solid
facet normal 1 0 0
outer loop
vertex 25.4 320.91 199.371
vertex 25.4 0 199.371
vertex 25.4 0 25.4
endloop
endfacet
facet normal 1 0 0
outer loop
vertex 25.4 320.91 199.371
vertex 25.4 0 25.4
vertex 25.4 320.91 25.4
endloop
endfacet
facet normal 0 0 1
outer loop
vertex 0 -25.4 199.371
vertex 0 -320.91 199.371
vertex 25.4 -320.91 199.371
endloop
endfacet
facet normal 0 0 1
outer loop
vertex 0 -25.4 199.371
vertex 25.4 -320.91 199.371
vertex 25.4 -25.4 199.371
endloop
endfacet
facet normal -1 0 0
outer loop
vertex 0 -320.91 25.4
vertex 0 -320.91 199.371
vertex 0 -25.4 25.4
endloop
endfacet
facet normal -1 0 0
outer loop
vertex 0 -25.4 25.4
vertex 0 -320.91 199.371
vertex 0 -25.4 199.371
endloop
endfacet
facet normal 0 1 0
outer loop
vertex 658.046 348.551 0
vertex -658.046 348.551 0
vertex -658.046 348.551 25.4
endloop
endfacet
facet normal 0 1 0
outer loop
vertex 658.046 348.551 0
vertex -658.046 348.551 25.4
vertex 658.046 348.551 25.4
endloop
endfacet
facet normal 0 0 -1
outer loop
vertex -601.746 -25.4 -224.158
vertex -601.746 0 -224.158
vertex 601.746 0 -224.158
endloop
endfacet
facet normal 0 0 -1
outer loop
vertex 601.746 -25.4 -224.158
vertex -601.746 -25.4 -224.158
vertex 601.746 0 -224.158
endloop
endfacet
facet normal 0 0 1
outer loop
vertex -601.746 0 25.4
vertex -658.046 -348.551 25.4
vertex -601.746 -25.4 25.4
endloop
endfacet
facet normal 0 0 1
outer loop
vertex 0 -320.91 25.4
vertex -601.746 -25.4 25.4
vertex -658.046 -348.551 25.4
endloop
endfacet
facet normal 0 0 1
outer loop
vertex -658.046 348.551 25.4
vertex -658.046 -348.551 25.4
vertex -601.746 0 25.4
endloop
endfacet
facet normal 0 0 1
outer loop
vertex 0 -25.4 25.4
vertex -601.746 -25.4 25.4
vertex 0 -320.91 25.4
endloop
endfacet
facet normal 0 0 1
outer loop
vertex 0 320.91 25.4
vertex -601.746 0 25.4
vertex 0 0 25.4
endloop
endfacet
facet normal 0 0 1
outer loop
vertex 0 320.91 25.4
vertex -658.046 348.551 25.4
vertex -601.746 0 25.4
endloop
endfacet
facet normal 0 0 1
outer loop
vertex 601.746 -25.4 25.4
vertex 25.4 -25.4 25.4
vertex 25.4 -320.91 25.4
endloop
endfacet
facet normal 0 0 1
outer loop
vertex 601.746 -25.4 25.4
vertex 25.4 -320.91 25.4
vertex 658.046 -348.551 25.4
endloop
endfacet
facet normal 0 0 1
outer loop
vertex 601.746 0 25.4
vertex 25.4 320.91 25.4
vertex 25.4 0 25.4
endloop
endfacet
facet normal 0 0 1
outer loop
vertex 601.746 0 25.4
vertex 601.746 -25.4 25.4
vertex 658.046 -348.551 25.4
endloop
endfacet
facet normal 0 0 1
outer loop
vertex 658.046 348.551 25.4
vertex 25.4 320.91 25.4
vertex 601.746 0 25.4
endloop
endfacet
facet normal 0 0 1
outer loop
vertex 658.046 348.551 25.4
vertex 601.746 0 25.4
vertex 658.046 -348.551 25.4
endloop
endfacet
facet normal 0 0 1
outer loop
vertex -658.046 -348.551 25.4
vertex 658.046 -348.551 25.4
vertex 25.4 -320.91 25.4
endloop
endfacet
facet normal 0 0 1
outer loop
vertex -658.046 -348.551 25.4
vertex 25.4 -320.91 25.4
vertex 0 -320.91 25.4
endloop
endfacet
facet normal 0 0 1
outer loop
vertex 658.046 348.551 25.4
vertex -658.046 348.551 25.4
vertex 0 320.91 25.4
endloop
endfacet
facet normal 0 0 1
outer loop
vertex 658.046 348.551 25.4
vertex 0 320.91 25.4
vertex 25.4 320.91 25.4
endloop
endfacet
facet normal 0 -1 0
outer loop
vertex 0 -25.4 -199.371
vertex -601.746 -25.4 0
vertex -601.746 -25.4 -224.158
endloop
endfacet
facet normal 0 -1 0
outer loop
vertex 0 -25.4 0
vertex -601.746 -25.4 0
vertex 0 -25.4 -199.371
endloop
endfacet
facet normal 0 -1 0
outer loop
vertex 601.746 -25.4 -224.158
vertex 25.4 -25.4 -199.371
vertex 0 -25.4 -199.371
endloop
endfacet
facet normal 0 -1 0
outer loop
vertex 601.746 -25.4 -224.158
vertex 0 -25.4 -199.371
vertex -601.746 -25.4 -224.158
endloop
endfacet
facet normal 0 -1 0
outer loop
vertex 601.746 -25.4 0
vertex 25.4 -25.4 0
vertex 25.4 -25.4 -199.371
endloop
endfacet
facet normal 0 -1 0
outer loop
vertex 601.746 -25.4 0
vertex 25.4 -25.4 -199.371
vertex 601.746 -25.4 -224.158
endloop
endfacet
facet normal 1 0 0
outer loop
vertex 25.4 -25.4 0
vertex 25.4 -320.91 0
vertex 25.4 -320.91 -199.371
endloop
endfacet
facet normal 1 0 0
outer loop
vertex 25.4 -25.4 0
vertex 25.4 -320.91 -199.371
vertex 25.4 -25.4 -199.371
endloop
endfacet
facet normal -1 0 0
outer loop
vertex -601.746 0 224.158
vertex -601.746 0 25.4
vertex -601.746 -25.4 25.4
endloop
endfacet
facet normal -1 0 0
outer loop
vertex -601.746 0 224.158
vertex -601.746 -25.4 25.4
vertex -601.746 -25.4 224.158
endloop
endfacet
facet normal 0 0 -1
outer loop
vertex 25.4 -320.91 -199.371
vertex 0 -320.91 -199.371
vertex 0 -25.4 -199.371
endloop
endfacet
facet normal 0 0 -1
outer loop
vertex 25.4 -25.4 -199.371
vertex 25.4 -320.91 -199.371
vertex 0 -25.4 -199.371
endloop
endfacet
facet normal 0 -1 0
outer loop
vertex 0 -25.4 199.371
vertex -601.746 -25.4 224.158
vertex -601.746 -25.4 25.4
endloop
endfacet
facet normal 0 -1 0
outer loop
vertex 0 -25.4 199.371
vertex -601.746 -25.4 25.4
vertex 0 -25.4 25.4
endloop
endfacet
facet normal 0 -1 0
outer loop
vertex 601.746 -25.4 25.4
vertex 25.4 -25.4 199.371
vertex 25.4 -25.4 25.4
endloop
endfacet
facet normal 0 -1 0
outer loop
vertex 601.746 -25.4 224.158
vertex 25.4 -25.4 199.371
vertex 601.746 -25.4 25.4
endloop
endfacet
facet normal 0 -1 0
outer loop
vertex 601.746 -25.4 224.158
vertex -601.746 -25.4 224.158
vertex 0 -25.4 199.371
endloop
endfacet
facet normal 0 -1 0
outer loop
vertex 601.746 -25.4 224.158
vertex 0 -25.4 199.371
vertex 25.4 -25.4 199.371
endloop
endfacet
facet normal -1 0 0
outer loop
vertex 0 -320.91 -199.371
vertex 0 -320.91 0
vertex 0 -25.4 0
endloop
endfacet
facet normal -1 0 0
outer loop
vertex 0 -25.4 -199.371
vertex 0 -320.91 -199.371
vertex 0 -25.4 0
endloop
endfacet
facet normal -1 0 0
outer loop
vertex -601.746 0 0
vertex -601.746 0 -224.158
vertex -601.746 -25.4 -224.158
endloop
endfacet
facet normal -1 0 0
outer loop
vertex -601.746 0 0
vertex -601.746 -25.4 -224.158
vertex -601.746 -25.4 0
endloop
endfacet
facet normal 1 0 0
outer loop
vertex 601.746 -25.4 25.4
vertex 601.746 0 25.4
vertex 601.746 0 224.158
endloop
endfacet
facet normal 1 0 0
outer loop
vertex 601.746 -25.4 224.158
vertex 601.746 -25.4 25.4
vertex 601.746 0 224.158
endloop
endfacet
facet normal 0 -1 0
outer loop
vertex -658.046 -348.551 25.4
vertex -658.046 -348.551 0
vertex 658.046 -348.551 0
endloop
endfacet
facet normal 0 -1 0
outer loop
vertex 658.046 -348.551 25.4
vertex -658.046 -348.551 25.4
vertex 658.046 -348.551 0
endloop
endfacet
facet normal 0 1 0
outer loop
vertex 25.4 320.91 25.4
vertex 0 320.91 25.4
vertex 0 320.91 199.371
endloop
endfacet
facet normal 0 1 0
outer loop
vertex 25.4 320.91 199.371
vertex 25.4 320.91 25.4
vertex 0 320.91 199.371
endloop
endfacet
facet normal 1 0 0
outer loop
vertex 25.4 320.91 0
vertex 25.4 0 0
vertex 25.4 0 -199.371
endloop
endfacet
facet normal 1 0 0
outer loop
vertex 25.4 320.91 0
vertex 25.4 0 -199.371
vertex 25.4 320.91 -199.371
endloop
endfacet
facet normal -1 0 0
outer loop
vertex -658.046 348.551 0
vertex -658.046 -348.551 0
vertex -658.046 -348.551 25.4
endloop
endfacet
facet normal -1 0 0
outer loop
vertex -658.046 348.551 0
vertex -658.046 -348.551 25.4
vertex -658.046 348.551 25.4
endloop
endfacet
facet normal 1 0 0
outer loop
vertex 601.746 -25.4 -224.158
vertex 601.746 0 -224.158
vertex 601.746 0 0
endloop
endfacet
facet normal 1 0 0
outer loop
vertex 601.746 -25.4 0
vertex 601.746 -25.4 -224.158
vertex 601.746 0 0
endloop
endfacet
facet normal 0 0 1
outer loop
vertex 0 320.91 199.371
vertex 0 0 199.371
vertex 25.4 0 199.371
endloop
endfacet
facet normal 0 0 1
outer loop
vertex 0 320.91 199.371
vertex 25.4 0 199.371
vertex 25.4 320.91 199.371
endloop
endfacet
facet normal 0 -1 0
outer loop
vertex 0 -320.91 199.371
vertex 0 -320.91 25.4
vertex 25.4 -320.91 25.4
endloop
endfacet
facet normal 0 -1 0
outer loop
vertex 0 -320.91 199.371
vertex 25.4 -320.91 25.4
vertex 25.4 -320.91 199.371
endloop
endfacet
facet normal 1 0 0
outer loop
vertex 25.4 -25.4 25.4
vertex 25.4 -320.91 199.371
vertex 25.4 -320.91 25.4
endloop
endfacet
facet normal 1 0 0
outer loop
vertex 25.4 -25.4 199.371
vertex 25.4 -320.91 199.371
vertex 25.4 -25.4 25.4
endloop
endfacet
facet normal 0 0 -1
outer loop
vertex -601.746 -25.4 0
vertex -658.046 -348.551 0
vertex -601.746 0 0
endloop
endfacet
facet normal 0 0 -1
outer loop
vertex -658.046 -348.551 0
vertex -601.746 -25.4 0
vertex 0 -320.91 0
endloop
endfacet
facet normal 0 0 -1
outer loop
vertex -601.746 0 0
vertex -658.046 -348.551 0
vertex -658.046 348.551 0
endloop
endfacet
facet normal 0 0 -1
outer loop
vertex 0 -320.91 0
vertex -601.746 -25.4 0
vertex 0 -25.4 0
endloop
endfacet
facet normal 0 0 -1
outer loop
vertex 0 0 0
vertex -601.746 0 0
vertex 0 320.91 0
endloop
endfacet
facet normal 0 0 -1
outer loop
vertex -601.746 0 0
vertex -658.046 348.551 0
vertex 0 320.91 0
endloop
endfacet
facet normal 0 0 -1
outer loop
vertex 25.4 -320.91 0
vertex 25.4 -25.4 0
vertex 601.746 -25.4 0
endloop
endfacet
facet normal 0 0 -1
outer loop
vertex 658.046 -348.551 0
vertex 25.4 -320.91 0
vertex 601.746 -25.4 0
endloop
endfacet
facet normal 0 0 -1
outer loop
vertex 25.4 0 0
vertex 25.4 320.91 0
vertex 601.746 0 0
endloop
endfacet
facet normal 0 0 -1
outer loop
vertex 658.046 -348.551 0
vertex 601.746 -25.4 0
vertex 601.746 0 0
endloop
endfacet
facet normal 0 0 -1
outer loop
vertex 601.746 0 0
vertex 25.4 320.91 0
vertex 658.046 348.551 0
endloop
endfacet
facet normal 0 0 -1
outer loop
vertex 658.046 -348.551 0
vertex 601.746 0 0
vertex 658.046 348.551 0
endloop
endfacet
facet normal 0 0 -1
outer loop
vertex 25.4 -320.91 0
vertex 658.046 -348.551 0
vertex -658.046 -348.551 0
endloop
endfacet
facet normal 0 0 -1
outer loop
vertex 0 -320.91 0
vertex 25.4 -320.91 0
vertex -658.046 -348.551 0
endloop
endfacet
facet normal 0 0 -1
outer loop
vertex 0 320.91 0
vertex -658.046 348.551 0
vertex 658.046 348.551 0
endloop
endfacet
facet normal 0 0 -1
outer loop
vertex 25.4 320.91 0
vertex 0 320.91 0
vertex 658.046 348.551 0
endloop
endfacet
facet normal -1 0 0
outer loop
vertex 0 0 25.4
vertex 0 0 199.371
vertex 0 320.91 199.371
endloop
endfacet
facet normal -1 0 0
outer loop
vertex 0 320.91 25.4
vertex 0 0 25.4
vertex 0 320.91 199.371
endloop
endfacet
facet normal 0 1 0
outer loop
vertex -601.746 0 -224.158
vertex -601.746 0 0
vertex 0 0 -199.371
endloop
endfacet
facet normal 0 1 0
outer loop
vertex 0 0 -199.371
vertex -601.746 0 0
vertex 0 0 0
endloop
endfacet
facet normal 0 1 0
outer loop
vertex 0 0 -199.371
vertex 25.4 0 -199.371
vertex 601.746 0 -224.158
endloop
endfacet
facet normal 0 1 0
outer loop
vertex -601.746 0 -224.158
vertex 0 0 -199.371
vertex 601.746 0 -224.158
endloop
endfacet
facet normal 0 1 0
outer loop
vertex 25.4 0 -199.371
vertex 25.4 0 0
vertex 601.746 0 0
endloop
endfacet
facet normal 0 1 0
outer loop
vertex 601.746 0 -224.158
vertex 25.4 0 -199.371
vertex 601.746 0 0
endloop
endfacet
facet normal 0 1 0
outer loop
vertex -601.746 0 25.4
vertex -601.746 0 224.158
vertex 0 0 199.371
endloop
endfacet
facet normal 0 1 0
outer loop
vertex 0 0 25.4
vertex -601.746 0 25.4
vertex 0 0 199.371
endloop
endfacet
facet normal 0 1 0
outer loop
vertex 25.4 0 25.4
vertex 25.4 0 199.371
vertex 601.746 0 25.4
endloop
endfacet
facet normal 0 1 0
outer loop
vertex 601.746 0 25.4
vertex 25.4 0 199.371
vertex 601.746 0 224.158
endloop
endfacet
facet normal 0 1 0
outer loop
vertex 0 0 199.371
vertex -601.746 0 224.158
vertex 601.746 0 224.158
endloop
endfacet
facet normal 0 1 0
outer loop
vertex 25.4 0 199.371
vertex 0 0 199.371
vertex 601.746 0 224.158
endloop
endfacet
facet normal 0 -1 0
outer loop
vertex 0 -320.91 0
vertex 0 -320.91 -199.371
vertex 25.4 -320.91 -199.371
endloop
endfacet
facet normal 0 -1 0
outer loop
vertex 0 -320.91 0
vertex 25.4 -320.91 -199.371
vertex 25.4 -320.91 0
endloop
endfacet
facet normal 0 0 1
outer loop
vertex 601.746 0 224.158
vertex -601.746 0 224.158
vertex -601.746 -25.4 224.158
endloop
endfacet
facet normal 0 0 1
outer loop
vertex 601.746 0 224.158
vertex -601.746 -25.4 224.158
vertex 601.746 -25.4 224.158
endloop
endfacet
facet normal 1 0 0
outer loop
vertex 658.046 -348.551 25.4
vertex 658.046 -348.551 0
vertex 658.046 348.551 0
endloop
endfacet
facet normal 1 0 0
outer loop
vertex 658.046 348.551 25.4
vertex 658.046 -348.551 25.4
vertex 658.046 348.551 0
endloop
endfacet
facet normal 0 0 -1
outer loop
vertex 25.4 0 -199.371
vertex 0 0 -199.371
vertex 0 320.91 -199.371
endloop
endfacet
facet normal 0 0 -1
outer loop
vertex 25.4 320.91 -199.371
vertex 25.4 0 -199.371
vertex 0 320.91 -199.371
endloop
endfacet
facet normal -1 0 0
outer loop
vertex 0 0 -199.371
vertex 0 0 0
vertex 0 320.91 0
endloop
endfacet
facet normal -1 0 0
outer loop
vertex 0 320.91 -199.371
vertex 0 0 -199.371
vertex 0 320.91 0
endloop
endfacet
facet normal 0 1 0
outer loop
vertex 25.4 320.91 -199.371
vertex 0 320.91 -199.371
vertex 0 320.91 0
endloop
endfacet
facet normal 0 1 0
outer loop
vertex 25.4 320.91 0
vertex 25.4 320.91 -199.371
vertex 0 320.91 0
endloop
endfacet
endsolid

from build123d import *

# Parameters (mm, degrees)
F0_W     = 1203.49264
F0_H     = 448.315588
F1_DEPTH = 25.4
F2_W     = 1316.091538
F2_H     = 697.101116
F3_DEPTH = 25.4
F4_W     = 641.82043
F4_H     = 398.742794
F5_DEPTH = 25.4


with BuildPart() as f1:
    # F0 (on Front) → F1 (new body)
    with BuildSketch(Plane.XZ):
        Rectangle(F0_W, F0_H)
    extrude(amount=F1_DEPTH)

    # F2 (on Top) → F3 (join)
    with BuildSketch(Plane.XY):
        Rectangle(F2_W, F2_H)
    extrude(amount=F3_DEPTH)

    # F4 (on Right) → F5 (join)
    with BuildSketch(Plane.YZ):
        Rectangle(F4_W, F4_H)
    extrude(amount=F5_DEPTH)


solid = f1.part
